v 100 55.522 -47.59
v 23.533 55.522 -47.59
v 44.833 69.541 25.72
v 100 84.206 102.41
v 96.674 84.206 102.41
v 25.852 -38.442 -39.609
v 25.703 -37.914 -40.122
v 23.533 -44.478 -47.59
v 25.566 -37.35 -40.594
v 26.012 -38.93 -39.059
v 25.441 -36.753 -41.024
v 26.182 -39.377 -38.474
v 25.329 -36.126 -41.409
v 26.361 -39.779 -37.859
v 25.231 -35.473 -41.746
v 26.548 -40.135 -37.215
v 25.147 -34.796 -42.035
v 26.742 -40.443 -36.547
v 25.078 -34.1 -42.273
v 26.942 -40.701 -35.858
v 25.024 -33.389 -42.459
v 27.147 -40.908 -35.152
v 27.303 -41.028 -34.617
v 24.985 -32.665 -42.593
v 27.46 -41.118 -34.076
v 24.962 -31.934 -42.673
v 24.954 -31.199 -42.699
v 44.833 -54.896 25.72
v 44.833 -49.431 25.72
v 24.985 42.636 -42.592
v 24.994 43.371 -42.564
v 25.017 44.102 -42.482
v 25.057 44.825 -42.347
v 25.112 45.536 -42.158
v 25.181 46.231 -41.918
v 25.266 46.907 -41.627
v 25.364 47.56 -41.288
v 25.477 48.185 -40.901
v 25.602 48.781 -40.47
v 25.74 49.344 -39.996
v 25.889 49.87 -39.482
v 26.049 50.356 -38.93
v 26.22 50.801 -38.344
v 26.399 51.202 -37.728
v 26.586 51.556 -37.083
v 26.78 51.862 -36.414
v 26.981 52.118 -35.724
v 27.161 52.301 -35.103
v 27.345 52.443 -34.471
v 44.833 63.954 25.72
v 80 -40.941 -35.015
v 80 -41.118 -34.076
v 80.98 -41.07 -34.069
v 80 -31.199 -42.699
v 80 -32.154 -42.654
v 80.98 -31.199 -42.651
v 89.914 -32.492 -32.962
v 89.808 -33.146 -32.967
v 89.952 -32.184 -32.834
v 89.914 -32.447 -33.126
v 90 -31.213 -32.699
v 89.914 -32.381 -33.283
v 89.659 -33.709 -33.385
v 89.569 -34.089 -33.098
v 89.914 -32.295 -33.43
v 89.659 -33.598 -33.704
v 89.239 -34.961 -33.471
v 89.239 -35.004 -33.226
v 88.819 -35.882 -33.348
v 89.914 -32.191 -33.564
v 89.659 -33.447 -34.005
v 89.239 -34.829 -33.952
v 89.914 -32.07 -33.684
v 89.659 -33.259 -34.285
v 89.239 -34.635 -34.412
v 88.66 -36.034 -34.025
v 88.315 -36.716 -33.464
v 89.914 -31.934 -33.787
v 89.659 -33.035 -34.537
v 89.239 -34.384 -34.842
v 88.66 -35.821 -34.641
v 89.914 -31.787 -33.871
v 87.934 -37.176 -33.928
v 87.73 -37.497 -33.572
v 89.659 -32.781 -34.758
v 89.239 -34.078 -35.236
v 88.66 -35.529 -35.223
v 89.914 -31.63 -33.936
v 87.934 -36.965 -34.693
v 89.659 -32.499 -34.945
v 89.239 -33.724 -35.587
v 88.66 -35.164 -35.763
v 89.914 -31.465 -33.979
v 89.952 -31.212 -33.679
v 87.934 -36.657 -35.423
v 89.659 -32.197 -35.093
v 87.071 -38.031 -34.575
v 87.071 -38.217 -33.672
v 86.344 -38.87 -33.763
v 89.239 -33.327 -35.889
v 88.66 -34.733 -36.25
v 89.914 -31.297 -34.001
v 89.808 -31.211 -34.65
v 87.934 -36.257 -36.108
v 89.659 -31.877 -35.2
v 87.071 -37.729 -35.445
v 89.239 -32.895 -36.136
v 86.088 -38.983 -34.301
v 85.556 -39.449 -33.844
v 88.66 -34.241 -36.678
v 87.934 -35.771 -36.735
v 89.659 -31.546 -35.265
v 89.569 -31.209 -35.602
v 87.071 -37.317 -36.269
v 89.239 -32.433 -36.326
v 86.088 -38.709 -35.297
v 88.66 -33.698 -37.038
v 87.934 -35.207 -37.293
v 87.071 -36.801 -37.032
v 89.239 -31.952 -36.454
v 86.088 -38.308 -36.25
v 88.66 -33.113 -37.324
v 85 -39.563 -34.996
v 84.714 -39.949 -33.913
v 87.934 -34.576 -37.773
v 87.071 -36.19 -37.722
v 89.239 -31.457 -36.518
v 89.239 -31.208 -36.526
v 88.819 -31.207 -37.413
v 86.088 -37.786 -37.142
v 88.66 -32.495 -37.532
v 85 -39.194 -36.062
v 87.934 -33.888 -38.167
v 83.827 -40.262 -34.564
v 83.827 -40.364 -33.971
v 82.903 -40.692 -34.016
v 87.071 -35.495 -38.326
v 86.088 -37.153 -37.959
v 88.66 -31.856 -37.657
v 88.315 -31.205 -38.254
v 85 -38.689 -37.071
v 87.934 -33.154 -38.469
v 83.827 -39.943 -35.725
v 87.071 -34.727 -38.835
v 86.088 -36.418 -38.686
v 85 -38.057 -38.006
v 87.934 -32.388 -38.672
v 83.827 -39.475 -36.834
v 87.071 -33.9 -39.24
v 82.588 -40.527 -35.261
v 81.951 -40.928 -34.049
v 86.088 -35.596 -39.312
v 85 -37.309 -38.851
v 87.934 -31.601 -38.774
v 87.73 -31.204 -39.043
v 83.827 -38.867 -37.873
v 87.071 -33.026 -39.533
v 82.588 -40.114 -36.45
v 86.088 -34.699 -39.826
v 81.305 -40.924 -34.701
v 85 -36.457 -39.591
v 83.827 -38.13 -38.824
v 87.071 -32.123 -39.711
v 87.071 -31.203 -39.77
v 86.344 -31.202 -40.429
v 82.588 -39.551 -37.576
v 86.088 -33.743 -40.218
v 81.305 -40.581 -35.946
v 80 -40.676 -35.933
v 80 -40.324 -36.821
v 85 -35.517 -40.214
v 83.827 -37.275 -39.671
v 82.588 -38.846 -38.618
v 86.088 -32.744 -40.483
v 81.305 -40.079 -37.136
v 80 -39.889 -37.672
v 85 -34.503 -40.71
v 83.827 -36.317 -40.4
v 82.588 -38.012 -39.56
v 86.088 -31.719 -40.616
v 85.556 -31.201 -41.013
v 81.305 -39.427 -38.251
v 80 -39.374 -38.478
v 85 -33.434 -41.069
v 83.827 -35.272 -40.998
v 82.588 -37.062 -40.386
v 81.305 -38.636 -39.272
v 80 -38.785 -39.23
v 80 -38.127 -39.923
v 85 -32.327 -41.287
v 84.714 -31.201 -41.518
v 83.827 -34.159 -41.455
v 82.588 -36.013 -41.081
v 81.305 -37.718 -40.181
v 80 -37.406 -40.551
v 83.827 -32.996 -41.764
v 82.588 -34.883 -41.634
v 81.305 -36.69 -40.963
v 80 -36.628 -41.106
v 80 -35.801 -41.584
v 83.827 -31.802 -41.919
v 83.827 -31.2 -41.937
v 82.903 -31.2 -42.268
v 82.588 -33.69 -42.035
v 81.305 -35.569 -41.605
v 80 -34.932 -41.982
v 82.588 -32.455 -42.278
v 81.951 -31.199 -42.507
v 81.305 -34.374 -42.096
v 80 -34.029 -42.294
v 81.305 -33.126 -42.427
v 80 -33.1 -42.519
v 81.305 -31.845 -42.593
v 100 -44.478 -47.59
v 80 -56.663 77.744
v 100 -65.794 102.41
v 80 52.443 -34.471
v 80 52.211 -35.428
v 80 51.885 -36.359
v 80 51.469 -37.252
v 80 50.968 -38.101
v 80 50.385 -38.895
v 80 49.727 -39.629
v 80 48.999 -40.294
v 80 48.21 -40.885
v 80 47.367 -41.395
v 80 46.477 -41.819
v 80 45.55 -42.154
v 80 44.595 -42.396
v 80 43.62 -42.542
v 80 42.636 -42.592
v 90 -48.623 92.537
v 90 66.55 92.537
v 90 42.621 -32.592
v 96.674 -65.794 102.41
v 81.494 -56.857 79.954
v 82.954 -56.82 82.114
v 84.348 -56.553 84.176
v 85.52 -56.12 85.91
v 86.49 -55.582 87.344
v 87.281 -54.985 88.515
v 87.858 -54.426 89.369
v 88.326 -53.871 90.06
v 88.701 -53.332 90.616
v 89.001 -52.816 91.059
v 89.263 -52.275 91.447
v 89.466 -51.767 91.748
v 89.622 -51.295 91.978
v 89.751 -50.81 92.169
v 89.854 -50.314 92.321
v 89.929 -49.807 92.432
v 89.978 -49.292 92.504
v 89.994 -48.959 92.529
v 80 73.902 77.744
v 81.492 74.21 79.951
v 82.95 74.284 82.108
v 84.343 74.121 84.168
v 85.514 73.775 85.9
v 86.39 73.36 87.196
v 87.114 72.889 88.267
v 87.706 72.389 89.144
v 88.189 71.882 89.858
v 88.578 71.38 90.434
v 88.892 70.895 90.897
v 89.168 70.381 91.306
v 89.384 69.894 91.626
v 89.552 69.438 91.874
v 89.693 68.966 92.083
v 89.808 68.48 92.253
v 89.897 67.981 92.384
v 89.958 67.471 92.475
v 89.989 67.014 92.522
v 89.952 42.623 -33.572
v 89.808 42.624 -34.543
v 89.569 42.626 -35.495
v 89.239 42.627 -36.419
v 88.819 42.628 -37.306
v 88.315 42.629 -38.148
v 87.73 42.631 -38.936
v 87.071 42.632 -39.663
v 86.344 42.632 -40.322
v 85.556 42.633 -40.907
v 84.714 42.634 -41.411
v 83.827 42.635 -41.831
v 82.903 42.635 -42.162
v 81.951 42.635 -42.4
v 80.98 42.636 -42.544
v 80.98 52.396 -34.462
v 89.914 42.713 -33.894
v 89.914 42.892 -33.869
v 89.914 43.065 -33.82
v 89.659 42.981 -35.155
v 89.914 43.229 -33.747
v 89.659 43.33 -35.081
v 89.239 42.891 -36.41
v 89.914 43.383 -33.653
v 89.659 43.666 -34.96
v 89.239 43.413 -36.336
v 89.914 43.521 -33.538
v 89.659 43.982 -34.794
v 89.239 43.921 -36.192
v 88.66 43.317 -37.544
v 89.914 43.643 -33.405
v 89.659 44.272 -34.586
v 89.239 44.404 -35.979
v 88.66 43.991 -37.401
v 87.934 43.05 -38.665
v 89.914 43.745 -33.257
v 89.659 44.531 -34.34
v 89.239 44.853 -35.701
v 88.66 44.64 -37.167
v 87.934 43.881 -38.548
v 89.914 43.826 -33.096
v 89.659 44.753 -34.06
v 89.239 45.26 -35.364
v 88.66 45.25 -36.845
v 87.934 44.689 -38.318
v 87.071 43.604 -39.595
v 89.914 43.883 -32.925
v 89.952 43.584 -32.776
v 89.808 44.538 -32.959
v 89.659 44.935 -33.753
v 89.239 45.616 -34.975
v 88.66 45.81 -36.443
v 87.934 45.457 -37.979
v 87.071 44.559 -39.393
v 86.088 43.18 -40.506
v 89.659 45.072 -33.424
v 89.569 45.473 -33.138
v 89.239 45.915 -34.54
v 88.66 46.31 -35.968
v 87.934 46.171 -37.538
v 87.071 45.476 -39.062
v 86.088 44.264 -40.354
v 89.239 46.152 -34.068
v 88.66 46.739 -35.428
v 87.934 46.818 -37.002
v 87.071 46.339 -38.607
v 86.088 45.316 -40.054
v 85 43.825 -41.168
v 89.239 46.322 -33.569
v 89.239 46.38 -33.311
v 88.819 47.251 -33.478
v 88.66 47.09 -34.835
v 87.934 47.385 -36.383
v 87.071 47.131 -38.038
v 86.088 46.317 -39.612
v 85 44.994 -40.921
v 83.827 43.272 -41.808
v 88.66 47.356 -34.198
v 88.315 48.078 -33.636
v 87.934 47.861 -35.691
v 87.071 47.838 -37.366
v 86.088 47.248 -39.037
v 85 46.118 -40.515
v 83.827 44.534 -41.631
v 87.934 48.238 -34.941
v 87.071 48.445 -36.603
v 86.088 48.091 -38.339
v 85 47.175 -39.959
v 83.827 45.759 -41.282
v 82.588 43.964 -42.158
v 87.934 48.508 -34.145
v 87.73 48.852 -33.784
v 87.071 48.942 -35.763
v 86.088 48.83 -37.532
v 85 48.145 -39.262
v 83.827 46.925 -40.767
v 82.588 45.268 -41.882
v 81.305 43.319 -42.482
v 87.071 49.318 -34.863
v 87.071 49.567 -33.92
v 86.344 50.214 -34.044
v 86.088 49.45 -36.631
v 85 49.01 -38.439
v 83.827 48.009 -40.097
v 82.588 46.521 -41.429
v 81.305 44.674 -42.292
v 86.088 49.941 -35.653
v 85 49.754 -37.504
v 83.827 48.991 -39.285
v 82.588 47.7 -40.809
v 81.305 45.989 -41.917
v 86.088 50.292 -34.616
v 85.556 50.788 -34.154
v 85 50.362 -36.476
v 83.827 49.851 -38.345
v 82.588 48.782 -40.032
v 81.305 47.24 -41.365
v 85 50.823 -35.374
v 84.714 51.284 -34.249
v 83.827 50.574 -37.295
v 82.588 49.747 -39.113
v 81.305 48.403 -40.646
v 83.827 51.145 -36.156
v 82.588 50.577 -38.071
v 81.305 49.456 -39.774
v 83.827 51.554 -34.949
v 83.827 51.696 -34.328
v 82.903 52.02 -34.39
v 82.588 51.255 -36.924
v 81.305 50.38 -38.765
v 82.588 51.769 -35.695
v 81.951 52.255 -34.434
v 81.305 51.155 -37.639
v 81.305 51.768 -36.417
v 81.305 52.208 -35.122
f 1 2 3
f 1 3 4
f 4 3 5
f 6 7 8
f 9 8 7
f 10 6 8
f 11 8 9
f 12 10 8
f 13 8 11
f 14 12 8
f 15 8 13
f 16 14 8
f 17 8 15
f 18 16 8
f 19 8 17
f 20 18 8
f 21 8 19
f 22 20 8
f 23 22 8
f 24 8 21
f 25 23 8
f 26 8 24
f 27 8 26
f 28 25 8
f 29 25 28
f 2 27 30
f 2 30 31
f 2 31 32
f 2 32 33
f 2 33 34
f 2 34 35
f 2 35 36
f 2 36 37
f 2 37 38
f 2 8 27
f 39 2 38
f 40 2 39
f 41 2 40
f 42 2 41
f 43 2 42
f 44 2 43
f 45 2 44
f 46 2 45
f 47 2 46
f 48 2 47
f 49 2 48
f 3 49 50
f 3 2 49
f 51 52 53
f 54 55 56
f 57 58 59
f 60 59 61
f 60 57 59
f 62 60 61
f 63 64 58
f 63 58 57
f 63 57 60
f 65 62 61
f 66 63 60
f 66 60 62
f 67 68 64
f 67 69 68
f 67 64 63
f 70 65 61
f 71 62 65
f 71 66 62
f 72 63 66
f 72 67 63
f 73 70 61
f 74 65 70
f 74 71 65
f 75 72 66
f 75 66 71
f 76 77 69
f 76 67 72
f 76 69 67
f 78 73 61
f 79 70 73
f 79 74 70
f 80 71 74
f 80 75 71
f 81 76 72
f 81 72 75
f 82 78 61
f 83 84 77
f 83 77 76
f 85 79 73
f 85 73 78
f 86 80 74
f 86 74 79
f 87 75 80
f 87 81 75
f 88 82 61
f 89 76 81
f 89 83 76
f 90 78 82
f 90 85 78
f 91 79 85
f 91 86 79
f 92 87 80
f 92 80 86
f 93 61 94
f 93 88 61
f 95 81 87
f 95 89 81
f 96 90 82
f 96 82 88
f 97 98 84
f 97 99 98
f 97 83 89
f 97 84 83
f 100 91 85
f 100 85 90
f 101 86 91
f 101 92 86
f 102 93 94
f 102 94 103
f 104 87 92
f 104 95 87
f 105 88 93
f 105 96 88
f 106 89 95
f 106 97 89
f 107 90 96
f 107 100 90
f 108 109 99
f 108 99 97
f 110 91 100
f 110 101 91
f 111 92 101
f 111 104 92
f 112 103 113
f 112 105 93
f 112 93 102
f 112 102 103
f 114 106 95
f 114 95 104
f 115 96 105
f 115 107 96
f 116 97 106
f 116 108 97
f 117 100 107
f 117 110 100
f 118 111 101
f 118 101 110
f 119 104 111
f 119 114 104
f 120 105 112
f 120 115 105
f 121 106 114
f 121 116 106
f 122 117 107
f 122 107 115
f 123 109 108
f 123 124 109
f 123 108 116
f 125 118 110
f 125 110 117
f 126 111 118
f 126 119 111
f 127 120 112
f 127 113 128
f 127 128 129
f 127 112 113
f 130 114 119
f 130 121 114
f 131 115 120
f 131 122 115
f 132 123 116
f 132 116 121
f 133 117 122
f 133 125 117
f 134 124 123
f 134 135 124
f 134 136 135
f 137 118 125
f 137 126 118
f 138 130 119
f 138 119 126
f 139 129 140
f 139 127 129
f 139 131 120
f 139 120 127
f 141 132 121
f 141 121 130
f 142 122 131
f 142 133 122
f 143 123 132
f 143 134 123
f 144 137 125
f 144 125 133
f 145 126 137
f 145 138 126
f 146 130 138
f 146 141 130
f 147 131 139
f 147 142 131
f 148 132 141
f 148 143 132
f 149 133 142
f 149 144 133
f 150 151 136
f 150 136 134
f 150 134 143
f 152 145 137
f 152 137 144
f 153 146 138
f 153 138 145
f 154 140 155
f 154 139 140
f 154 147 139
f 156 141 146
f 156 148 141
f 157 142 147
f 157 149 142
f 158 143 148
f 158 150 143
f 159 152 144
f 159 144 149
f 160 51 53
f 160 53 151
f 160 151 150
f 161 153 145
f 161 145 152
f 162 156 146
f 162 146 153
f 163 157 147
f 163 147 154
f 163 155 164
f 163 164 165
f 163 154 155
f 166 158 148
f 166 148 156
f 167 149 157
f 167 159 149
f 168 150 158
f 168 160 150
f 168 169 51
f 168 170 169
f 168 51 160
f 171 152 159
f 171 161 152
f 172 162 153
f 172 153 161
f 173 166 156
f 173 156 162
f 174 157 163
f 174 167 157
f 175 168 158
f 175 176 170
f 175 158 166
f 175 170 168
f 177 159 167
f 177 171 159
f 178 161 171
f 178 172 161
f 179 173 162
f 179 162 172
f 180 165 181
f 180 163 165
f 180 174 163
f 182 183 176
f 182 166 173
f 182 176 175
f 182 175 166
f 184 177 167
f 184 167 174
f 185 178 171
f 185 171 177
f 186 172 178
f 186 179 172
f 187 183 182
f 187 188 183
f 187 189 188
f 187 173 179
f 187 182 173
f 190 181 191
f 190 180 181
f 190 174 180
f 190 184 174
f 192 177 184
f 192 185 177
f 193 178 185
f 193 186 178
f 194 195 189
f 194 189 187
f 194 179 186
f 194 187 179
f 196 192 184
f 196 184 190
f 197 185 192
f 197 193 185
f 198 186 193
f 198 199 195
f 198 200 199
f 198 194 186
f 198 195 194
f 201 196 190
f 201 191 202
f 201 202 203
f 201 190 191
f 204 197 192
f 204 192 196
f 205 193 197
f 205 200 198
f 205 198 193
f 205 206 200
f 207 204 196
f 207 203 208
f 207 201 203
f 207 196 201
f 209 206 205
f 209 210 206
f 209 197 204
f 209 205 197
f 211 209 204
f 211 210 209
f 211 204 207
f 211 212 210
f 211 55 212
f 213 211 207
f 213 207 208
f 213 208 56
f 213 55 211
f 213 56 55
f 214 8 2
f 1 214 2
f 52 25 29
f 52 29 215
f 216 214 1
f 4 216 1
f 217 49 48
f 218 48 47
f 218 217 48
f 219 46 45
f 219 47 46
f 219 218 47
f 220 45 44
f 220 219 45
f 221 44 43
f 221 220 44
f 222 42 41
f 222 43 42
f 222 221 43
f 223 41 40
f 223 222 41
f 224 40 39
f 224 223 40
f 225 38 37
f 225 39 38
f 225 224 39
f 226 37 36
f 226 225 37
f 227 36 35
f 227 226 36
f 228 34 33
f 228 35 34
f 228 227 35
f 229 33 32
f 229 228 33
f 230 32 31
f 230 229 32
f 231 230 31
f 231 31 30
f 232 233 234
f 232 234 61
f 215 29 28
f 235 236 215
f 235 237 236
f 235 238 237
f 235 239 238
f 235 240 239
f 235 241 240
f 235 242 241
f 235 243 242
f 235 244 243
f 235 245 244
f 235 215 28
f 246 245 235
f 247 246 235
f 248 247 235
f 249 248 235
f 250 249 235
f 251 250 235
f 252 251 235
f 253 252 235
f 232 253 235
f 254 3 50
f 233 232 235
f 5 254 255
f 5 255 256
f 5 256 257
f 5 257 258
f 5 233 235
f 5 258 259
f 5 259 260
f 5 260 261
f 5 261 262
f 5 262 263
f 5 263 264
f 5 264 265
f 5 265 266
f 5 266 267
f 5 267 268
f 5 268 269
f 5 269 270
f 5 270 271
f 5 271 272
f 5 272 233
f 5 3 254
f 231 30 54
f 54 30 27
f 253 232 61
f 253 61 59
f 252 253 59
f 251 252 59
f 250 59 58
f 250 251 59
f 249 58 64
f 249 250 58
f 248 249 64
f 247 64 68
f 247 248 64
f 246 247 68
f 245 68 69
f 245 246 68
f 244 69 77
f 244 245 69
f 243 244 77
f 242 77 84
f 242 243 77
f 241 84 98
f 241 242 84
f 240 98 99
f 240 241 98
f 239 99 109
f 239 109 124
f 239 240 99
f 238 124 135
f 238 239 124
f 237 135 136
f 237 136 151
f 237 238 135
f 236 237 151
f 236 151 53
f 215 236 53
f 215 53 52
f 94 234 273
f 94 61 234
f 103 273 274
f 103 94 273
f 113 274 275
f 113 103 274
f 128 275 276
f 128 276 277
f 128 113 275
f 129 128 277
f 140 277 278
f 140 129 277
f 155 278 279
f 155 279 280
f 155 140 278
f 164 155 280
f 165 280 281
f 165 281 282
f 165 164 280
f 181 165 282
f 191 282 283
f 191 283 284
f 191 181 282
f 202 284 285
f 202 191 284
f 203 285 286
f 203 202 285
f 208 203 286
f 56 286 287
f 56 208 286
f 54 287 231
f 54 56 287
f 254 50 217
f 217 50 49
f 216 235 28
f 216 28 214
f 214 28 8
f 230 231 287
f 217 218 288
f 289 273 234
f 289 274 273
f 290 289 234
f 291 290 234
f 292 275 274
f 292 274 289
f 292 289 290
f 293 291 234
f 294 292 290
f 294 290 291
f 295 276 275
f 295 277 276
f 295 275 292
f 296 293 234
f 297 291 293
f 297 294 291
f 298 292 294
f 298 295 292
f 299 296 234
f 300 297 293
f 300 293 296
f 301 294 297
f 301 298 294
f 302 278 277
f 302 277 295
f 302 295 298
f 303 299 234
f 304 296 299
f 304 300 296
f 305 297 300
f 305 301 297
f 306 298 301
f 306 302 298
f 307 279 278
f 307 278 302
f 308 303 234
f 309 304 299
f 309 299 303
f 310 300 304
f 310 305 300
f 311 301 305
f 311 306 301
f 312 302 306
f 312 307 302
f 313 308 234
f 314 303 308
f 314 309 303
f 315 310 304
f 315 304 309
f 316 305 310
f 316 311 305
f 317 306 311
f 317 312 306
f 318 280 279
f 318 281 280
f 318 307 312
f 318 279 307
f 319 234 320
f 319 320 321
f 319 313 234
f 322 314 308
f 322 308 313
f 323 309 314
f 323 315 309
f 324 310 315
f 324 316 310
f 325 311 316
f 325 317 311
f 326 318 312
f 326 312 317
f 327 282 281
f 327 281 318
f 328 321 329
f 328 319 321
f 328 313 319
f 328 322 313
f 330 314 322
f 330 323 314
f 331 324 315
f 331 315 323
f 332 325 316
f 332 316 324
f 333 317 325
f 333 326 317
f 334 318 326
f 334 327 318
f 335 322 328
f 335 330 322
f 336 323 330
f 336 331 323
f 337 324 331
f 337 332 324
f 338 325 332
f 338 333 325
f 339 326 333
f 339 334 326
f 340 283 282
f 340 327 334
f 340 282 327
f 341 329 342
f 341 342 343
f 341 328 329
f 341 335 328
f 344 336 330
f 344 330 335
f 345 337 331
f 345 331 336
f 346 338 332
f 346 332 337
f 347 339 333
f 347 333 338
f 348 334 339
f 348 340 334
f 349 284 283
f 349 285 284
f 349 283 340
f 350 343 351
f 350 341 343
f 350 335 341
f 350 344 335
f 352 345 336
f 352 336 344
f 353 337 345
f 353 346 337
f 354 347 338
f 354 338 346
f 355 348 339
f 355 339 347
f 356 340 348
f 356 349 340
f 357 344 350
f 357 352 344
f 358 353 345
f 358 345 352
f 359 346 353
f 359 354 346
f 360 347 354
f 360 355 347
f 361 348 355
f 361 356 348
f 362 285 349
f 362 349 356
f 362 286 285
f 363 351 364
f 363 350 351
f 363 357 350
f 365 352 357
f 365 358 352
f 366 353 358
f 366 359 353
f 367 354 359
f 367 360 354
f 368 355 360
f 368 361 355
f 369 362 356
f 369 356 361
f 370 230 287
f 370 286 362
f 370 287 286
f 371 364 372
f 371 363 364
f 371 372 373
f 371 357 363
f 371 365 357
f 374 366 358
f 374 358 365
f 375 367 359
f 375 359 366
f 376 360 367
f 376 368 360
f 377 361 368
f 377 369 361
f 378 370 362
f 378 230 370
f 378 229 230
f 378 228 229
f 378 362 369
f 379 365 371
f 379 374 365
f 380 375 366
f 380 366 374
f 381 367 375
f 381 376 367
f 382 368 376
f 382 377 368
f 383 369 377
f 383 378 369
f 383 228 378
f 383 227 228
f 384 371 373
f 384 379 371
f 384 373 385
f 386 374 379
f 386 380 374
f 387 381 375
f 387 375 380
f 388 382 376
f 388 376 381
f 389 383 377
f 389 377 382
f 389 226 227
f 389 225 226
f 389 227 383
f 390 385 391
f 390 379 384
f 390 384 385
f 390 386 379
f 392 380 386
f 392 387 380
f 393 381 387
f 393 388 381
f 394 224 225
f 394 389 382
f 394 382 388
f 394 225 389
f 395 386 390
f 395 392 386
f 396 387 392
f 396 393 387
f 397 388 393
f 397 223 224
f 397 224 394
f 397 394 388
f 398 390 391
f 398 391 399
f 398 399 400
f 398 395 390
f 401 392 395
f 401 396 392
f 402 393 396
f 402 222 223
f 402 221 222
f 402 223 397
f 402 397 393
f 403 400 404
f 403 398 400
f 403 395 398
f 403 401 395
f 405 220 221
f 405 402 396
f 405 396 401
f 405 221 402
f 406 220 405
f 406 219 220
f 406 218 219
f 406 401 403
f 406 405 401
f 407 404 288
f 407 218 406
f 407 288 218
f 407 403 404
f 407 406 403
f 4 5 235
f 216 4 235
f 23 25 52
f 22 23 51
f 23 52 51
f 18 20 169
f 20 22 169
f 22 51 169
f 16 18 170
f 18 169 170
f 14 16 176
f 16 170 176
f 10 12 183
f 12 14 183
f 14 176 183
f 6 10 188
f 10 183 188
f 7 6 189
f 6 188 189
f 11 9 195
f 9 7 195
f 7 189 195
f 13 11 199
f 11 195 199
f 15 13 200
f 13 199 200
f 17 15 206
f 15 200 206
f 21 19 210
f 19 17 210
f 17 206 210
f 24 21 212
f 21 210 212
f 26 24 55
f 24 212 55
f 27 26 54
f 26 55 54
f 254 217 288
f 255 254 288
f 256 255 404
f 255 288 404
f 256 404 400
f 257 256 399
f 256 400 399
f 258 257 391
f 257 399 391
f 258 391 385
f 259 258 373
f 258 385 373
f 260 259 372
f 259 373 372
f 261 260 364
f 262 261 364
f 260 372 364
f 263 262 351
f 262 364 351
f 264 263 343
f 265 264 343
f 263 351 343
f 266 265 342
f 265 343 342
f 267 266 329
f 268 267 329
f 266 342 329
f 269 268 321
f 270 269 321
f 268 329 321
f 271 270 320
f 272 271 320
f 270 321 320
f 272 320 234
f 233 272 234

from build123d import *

# Parameters (mm, degrees)
F1_DEPTH      = 100
F3_DEPTH      = 90
F4_R          = 10
F6_DEPTH      = 65.794616
F6_DEPTH_BACK = 84.207384


with BuildPart() as f1:
    # F0 (on Right) → F1 (new body)
    with BuildSketch(Plane.YZ):
        Polygon((84.206384, 102.410072), (-65.793616, 102.410072), (-44.478415, -47.589928), (55.521585, -47.589928), align=None)
    extrude(amount=F1_DEPTH)

    # F2 (on face) → F3 (cut)
    with BuildSketch(Plane(origin=(0, 0, 0), x_dir=(0, -1, 0), z_dir=(-1, 0, 0))):
        Polygon((60.0917, 102.410072), (-78.619334, 102.410072), (-50.892521, -42.580376), (39.917622, -42.711261), align=None)
    extrude(amount=-F3_DEPTH, mode=Mode.SUBTRACT)

    # F4
    f4_edges = [f1.edges().sort_by_distance(p)[0] for p in [
        (45, 50.892521, -42.580376),
        (90, 5.48745, -42.645818),
        (45, -39.917622, -42.711261),
        (90, 64.755927, 29.914848),
        (90, -50.004661, 29.849406),
    ]]
    fillet(f4_edges, radius=F4_R)

    # F5 (on Front) → F6 (cut, two sides)
    with BuildSketch(Plane.XZ) as f6_sk:
        Polygon((-27.018974, -66.479579), (18.04512, -66.479579), (44.833042, 25.719849), (101.288192, 109.236158), (-27.018974, 105.970137), align=None)
    extrude(amount=F6_DEPTH, mode=Mode.SUBTRACT)
    extrude(f6_sk.sketch, amount=-F6_DEPTH_BACK, mode=Mode.SUBTRACT)


solid = f1.part
